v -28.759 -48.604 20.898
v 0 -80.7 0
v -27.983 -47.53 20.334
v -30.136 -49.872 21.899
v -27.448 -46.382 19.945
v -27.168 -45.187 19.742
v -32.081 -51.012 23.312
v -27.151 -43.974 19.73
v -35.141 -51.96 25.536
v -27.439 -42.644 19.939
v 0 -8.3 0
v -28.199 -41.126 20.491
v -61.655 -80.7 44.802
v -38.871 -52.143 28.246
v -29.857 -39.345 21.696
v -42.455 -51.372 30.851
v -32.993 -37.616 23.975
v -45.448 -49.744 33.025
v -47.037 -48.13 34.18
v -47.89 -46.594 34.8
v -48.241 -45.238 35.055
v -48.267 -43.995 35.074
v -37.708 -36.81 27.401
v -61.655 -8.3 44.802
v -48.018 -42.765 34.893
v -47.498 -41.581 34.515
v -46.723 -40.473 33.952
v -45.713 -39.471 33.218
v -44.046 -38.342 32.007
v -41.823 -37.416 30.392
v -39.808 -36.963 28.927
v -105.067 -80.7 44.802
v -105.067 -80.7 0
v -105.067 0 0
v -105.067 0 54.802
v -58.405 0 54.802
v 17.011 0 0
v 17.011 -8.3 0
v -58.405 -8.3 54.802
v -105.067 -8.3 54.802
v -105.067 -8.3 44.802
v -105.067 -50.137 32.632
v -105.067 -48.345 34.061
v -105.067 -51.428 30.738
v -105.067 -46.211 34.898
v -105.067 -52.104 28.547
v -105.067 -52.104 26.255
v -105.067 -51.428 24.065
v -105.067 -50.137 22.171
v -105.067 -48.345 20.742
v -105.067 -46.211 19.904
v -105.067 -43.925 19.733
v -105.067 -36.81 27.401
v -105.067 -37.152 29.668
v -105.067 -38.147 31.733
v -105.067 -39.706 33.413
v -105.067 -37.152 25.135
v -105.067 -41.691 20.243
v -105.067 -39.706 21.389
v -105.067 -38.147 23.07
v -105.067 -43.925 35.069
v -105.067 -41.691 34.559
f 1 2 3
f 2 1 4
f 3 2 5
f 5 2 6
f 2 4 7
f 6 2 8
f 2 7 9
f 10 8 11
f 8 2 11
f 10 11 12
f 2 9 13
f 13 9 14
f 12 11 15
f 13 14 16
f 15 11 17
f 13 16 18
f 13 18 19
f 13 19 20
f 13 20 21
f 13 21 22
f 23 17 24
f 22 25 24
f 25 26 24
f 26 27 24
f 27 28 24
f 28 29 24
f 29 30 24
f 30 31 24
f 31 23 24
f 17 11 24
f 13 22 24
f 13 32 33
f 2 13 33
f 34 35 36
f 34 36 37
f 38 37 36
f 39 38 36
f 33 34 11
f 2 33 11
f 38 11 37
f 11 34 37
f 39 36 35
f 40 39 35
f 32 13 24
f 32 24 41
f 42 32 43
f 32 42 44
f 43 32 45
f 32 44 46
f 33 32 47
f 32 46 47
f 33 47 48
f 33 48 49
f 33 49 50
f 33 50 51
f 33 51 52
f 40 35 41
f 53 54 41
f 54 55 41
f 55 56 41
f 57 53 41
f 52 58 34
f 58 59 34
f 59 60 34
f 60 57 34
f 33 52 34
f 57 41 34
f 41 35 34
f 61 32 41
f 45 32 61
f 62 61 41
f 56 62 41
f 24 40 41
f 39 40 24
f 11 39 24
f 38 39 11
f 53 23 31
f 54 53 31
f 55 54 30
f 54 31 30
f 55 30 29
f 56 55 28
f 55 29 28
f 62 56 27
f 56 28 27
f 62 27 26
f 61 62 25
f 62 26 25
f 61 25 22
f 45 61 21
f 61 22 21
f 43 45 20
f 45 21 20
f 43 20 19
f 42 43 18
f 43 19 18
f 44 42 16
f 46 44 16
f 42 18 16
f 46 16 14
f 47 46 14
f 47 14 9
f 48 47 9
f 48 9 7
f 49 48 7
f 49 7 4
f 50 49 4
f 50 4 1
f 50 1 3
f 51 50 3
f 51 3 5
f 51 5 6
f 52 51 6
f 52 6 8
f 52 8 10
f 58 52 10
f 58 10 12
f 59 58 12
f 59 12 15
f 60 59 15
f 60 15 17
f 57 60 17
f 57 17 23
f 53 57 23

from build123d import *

# Parameters (mm, degrees)
F1_DEPTH = 80.7
F2_DEPTH = 8.3
F3_R     = 7.689637
F4_DEPTH = 105.067501


with BuildPart() as f1:
    # F0 (on Front) → F1 (new body)
    with BuildSketch(Plane.XZ):
        Polygon((-105.066501, 0), (0, 0), (-61.654873, 44.802453), (-105.066501, 44.802453), align=None)
    extrude(amount=F1_DEPTH)

    # F0 (on Front) → F2 (join)
    with BuildSketch(Plane.XZ):
        Polygon((-61.654873, 44.802453), (0, 0), (17.011136, 0), (-58.405232, 54.802453), (-105.066501, 54.802453), (-105.066501, 44.802453), align=None)
    extrude(amount=F2_DEPTH)

    # F3 (on Right) → F4 (cut, through all)
    with BuildSketch(Plane.YZ):
        with Locations((-44.5, 27.401227)):
            Circle(F3_R)
    extrude(amount=-F4_DEPTH, mode=Mode.SUBTRACT)


solid = f1.part
